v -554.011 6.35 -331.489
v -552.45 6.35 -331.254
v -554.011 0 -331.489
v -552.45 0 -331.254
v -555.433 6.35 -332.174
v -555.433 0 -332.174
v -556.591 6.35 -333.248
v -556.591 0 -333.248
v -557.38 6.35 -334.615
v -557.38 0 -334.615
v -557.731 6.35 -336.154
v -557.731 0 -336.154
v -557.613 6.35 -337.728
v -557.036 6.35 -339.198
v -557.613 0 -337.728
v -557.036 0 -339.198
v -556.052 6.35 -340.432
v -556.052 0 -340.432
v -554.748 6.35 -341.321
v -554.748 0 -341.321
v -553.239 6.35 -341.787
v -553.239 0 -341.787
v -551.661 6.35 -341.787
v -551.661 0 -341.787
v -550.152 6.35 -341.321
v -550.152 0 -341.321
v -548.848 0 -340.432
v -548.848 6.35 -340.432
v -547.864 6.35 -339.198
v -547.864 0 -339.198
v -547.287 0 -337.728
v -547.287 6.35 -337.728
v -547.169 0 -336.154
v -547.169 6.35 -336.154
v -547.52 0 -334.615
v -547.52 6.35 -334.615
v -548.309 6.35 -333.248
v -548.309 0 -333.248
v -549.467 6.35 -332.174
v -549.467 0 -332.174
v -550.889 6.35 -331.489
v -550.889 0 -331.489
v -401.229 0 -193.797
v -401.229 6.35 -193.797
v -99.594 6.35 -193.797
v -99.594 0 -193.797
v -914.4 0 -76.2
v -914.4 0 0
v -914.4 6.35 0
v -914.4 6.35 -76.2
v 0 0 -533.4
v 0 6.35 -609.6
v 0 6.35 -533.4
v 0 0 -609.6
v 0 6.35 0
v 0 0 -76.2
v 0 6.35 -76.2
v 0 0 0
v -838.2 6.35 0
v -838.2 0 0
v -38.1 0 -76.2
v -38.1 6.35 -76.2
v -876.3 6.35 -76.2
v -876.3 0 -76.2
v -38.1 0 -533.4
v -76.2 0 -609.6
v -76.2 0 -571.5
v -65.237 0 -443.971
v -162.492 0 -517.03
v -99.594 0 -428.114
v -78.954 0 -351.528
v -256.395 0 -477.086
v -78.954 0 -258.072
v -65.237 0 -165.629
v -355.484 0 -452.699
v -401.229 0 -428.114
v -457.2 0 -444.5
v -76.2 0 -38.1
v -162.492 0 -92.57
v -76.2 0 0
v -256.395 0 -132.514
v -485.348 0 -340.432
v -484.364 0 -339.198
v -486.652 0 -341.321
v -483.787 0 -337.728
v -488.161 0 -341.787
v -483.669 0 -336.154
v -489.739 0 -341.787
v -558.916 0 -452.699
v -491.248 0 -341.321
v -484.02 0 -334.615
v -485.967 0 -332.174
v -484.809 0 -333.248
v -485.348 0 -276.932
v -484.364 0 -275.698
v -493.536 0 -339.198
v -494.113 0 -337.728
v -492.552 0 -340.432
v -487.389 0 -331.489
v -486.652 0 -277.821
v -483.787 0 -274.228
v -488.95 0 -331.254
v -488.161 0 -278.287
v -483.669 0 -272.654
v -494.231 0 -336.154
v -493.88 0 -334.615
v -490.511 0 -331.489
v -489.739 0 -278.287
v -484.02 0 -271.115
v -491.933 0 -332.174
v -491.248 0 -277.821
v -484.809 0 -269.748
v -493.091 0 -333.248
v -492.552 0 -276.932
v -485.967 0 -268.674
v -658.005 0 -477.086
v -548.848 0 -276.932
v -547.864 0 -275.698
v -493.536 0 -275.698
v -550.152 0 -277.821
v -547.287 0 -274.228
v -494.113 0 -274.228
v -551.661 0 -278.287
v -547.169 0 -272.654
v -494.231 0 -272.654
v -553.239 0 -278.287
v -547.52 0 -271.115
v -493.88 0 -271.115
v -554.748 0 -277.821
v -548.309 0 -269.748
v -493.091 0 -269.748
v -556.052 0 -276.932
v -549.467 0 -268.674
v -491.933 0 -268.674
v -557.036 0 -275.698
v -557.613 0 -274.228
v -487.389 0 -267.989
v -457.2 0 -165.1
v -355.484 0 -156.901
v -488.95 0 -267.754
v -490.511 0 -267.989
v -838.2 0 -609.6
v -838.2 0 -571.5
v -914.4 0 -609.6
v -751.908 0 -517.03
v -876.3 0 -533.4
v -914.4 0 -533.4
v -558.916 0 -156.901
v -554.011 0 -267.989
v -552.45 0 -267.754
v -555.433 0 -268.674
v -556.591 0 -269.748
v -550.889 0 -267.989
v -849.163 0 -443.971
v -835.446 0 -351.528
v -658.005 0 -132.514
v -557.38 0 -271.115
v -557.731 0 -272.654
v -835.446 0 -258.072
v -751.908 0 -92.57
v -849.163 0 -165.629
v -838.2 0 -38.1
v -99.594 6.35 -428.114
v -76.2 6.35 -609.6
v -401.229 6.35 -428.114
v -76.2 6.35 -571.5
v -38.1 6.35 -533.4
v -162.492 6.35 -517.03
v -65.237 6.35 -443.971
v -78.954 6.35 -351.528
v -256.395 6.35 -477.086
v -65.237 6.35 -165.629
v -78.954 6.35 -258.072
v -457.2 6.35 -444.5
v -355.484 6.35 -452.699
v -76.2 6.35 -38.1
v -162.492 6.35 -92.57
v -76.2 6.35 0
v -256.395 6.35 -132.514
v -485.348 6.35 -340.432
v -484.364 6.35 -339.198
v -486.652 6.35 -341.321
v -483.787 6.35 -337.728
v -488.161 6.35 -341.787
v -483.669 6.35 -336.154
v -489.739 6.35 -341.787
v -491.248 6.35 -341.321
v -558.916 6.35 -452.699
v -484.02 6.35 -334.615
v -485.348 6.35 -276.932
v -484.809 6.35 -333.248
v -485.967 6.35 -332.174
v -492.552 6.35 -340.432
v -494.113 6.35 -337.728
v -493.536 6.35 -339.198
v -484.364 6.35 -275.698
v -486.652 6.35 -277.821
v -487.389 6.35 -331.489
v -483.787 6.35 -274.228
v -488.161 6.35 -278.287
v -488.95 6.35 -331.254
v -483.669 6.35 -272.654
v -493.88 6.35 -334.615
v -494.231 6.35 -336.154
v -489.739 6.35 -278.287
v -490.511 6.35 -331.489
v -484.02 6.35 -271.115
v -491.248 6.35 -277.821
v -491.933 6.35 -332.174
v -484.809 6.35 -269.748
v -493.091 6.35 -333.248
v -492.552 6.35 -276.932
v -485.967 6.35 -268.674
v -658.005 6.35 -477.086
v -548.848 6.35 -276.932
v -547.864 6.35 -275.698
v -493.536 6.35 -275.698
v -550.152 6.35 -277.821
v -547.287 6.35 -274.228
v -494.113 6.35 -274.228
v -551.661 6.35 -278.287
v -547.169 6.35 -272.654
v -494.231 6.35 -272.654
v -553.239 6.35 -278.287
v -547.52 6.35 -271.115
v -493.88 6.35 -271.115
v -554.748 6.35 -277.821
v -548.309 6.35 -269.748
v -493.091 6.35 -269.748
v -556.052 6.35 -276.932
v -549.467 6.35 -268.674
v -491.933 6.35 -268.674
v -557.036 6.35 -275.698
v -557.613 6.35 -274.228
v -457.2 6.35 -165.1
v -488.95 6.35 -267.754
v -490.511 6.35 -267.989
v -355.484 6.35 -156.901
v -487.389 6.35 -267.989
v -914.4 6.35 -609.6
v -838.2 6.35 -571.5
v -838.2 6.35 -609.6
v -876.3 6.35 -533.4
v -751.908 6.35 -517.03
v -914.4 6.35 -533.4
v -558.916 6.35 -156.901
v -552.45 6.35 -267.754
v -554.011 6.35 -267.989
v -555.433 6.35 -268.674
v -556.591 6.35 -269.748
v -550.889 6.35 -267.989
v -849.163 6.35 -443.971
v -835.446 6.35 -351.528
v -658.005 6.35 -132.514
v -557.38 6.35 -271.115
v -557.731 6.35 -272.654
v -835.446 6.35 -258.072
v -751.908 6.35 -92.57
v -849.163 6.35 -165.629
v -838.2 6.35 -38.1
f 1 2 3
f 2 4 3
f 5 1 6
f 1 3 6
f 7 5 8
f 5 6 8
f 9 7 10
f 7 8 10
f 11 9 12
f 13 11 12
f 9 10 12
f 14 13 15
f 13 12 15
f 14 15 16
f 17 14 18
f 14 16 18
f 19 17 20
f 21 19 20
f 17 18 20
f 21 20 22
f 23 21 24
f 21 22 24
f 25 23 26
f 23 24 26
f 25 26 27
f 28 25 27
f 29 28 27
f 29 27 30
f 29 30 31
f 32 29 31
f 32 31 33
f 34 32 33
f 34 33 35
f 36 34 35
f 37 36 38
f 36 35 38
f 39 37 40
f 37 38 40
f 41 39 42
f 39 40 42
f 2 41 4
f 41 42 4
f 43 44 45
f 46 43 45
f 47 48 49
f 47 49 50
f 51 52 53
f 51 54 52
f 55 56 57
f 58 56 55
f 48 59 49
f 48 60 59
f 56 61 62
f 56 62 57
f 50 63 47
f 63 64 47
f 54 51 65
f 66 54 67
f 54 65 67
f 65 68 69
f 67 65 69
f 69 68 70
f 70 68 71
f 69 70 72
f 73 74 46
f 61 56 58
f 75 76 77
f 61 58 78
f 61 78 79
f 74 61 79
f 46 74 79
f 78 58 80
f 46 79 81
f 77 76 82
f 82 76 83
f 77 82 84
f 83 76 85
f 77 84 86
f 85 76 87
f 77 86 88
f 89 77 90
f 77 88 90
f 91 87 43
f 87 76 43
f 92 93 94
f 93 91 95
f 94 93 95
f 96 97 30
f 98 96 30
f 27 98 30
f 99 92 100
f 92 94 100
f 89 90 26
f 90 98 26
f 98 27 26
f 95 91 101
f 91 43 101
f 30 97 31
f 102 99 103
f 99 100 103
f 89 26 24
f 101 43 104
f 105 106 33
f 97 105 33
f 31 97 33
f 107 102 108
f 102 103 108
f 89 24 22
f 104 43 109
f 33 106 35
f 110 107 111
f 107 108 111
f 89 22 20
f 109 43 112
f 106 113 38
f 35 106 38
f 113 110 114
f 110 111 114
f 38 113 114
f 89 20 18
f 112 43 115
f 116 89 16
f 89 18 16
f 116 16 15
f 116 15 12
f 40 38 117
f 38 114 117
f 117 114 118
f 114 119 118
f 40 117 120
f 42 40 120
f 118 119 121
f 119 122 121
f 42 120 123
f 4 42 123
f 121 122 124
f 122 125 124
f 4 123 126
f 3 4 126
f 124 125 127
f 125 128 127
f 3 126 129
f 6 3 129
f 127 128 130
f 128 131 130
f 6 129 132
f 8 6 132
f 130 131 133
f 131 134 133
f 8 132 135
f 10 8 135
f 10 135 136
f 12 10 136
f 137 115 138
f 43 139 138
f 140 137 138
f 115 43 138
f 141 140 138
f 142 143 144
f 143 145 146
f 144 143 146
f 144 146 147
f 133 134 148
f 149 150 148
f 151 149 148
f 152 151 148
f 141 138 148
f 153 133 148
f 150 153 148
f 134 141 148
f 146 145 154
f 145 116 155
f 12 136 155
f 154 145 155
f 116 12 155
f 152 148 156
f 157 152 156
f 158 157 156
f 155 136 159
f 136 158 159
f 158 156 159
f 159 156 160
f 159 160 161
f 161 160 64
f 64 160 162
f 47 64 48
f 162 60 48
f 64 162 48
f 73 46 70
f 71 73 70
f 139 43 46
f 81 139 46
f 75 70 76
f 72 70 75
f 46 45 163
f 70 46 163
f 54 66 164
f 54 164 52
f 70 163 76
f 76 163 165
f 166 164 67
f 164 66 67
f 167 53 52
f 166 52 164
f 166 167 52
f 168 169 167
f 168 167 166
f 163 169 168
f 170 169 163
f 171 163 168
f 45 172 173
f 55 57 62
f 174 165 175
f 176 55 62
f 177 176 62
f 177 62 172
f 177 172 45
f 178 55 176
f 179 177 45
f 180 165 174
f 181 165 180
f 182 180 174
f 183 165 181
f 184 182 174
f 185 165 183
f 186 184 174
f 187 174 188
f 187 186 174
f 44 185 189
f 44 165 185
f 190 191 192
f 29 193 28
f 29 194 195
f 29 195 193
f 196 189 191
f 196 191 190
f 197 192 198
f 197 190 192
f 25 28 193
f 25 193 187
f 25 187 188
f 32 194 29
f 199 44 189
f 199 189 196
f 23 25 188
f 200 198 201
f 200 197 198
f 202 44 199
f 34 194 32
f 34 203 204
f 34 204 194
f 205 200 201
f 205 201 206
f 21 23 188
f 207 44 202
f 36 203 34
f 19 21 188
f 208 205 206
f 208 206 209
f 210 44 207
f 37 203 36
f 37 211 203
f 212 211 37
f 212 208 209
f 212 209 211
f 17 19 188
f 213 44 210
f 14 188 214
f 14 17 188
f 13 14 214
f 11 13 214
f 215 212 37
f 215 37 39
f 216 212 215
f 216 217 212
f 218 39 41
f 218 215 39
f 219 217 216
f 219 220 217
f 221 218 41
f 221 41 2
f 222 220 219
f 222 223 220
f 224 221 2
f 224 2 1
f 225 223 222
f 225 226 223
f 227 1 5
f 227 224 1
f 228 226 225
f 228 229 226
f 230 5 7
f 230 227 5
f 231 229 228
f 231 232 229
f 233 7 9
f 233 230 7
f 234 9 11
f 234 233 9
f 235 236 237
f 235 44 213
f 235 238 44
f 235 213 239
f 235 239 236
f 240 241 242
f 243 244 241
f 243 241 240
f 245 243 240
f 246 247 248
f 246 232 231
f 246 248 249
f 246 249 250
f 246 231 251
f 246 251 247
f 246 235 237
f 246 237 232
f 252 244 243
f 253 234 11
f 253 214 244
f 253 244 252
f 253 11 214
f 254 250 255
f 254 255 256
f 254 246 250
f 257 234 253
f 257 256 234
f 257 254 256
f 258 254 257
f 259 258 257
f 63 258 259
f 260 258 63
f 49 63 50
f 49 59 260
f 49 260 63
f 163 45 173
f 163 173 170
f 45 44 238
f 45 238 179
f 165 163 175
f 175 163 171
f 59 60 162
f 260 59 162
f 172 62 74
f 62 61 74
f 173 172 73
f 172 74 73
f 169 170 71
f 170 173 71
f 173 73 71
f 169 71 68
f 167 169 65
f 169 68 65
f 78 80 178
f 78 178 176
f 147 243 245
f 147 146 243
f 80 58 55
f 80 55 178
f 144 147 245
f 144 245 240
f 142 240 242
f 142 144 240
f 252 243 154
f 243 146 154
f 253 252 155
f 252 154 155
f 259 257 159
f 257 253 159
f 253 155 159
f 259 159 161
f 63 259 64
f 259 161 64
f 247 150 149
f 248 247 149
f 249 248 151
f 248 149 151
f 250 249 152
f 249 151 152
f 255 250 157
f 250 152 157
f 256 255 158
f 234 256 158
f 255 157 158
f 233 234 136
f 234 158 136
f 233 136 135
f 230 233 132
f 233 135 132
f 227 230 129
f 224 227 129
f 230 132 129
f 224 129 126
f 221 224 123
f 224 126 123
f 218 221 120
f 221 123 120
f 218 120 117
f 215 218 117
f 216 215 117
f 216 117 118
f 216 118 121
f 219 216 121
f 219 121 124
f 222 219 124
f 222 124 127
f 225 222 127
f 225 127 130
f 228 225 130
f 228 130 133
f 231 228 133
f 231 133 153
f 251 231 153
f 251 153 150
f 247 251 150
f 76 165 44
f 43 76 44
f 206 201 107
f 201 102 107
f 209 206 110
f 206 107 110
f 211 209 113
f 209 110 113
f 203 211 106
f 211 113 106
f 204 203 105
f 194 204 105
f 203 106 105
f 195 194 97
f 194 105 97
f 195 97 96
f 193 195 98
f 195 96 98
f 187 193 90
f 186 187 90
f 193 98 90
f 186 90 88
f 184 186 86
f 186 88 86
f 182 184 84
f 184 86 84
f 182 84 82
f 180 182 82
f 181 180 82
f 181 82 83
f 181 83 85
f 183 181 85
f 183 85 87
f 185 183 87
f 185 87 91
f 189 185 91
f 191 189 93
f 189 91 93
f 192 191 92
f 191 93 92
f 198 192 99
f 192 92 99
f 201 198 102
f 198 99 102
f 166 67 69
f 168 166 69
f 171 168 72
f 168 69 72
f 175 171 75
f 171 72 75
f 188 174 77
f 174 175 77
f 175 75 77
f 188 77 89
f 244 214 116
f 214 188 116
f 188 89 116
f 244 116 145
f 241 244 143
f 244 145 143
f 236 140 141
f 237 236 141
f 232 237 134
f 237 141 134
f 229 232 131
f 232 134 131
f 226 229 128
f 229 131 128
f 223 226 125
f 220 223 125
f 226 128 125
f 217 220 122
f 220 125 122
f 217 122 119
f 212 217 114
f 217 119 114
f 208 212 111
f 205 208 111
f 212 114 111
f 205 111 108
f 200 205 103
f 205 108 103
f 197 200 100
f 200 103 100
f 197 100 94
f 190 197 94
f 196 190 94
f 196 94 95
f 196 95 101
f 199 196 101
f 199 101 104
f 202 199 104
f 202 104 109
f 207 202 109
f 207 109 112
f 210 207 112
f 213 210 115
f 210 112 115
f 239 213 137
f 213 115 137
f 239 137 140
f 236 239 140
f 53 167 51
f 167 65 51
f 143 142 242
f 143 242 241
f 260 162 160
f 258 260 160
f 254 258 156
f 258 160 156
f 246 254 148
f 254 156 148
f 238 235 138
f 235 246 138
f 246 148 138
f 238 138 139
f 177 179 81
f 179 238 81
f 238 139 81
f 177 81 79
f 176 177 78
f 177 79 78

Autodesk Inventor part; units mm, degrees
ref_plane "YZ Plane" through (0, 0, 0) normal (1, 0, 0) x (0, 1, 0)
ref_plane "XZ Plane" through (0, 0, 0) normal (0, 1, 0) x (-1, 0, 0)
ref_plane "XY Plane" through (0, 0, 0) normal (0, 0, 1) x (1, 0, 0)
sketch "Sketch1" plane through (0, 0, 0) normal (0, 1, 0) x (-1, 0, 0)
  line L0 (0, 0) -> (914.4, 0)
  line L1 (914.4, 0) -> (914.4, -609.6)
  line L2 (914.4, -609.6) -> (0, -609.6)
  line L3 (0, -609.6) -> (0, 0)
  line L4 (0, -609.6) -> (76.2, -609.6)
  line L5 (76.2, -609.6) -> (76.2, -533.4)
  line L6 (76.2, -533.4) -> (0, -533.4)
  line L7 (0, -533.4) -> (0, -609.6)
  line L8 (0, 0) -> (76.2, 0)
  line L9 (76.2, 0) -> (76.2, -76.2)
  line L10 (76.2, -76.2) -> (0, -76.2)
  line L11 (0, -76.2) -> (0, 0)
  line L12 (914.4, -609.6) -> (838.2, -609.6)
  line L13 (838.2, -609.6) -> (838.2, -533.4)
  line L14 (838.2, -533.4) -> (914.4, -533.4)
  line L15 (914.4, -533.4) -> (914.4, -609.6)
  line L16 (914.4, 0) -> (838.2, 0)
  line L17 (838.2, 0) -> (838.2, -76.2)
  line L18 (838.2, -76.2) -> (914.4, -76.2)
  line L19 (914.4, -76.2) -> (914.4, 0)
  arc A0 (838.2, -571.5) -> (76.2, -571.5) centre (457.2, -1079.5) ccw
  arc A1 (76.2, -38.1) -> (838.2, -38.1) centre (457.2, 469.9) ccw
  arc A2 (876.3, -76.2) -> (876.3, -533.4) centre (1468.7247, -304.8) ccw
  arc A3 (38.1, -533.4) -> (38.1, -76.2) centre (-554.3247, -304.8) ccw
  dimension "d17" = 609.6
  dimension "d18" = 76.2
  dimension "d19" = 76.2
  dimension "d20" = 76.2
  dimension "d21" = 76.2
  dimension "d22" = 76.2
  dimension "d23" = 76.2
  dimension "d24" = 76.2
  dimension "d25" = 76.2
  dimension "d26" = 635
  dimension "d27" = 635
  dimension "d28" = 635
  dimension "d29" = 635
extrude "Extrusion2" add sketch "Sketch1" along normal blind 6.35 contours L0 L9 L10 L3 | L0 L1 L18 L17 | A1 L17 L18 A2 L14 L13 A0 L5 L6 A3 L10 L9 | L6 L5 L2 L3 | L1 L2 L13 L14
sketch "Sketch2" plane through (0, 6.35, 0) normal (0, 1, 0) x (1, 0, 0)
  arc A0 (-76.2, 38.1) -> (-838.2, 38.1) centre (-457.2, -469.9) ccw projected
  arc A1 (-838.2, 571.5) -> (-76.2, 571.5) centre (-457.2, 1079.5) ccw projected
  line L0 (-457.2, 304.8) -> (-457.2, 241.3)
  line L1 (-457.2, 241.3) -> (-584.2, 241.3)
  line L2 (-584.2, 241.3) -> (-584.2, 368.3)
  line L3 (-584.2, 368.3) -> (-457.2, 368.3)
  line L4 (-457.2, 368.3) -> (-457.2, 241.3)
  line L5 (-584.2, 304.8) -> (-520.7, 368.3) construction
  line L6 (-520.7, 368.3) -> (-457.2, 304.8) construction
  line L7 (-552.45, 336.55) -> (-488.95, 336.55) construction
  line L8 (-584.2, 304.8) -> (-520.7, 241.3) construction
  line L9 (-457.2, 304.8) -> (-520.7, 241.3) construction
  line L10 (-552.45, 273.05) -> (-488.95, 273.05) construction
  circle A2 centre (-552.45, 273.05) radius 4.5 construction
  circle A3 centre (-488.95, 273.05) radius 4.5 construction
  circle A4 centre (-488.95, 336.55) radius 4.5 construction
  circle A5 centre (-552.45, 336.55) radius 4.5 construction
  point P0 (0, 0)
  dimension "d35" = 9
  dimension "d36" = 9
  dimension "d37" = 9
  dimension "d38" = 9
hole "Hole1" at (-552.45, 6.35, -273.05) at (-552.45, 6.35, -336.55) at (-488.95, 6.35, -336.55) at (-488.95, 6.35, -273.05) direction (0, -1, 0) diameter 10.5918 end through all thread size "1/2-13 UNC" class "2B" standard "ANSI Unified Screw Threads"
sketch "Sketch3" plane through (0, 6.35, 0) normal (0, 1, 0) x (1, 0, 0)
  point P0 (0, 0)
sketch "Sketch4" plane through (0, 6.35, 0) normal (0, 1, 0) x (1, 0, 0)
  line L0 (-401.2293, 193.7971) -> (-99.5943, 193.7971)
  line L1 (-99.5943, 193.7971) -> (-99.5943, 428.1144)
  line L2 (-99.5943, 428.1144) -> (-401.2293, 428.1144)
  line L3 (-401.2293, 428.1144) -> (-401.2293, 193.7971)
  point P0 (0, 0)
extrude "Extrusion3" cut sketch "Sketch4" against normal blind 6.35
properties part number "TopV3"
